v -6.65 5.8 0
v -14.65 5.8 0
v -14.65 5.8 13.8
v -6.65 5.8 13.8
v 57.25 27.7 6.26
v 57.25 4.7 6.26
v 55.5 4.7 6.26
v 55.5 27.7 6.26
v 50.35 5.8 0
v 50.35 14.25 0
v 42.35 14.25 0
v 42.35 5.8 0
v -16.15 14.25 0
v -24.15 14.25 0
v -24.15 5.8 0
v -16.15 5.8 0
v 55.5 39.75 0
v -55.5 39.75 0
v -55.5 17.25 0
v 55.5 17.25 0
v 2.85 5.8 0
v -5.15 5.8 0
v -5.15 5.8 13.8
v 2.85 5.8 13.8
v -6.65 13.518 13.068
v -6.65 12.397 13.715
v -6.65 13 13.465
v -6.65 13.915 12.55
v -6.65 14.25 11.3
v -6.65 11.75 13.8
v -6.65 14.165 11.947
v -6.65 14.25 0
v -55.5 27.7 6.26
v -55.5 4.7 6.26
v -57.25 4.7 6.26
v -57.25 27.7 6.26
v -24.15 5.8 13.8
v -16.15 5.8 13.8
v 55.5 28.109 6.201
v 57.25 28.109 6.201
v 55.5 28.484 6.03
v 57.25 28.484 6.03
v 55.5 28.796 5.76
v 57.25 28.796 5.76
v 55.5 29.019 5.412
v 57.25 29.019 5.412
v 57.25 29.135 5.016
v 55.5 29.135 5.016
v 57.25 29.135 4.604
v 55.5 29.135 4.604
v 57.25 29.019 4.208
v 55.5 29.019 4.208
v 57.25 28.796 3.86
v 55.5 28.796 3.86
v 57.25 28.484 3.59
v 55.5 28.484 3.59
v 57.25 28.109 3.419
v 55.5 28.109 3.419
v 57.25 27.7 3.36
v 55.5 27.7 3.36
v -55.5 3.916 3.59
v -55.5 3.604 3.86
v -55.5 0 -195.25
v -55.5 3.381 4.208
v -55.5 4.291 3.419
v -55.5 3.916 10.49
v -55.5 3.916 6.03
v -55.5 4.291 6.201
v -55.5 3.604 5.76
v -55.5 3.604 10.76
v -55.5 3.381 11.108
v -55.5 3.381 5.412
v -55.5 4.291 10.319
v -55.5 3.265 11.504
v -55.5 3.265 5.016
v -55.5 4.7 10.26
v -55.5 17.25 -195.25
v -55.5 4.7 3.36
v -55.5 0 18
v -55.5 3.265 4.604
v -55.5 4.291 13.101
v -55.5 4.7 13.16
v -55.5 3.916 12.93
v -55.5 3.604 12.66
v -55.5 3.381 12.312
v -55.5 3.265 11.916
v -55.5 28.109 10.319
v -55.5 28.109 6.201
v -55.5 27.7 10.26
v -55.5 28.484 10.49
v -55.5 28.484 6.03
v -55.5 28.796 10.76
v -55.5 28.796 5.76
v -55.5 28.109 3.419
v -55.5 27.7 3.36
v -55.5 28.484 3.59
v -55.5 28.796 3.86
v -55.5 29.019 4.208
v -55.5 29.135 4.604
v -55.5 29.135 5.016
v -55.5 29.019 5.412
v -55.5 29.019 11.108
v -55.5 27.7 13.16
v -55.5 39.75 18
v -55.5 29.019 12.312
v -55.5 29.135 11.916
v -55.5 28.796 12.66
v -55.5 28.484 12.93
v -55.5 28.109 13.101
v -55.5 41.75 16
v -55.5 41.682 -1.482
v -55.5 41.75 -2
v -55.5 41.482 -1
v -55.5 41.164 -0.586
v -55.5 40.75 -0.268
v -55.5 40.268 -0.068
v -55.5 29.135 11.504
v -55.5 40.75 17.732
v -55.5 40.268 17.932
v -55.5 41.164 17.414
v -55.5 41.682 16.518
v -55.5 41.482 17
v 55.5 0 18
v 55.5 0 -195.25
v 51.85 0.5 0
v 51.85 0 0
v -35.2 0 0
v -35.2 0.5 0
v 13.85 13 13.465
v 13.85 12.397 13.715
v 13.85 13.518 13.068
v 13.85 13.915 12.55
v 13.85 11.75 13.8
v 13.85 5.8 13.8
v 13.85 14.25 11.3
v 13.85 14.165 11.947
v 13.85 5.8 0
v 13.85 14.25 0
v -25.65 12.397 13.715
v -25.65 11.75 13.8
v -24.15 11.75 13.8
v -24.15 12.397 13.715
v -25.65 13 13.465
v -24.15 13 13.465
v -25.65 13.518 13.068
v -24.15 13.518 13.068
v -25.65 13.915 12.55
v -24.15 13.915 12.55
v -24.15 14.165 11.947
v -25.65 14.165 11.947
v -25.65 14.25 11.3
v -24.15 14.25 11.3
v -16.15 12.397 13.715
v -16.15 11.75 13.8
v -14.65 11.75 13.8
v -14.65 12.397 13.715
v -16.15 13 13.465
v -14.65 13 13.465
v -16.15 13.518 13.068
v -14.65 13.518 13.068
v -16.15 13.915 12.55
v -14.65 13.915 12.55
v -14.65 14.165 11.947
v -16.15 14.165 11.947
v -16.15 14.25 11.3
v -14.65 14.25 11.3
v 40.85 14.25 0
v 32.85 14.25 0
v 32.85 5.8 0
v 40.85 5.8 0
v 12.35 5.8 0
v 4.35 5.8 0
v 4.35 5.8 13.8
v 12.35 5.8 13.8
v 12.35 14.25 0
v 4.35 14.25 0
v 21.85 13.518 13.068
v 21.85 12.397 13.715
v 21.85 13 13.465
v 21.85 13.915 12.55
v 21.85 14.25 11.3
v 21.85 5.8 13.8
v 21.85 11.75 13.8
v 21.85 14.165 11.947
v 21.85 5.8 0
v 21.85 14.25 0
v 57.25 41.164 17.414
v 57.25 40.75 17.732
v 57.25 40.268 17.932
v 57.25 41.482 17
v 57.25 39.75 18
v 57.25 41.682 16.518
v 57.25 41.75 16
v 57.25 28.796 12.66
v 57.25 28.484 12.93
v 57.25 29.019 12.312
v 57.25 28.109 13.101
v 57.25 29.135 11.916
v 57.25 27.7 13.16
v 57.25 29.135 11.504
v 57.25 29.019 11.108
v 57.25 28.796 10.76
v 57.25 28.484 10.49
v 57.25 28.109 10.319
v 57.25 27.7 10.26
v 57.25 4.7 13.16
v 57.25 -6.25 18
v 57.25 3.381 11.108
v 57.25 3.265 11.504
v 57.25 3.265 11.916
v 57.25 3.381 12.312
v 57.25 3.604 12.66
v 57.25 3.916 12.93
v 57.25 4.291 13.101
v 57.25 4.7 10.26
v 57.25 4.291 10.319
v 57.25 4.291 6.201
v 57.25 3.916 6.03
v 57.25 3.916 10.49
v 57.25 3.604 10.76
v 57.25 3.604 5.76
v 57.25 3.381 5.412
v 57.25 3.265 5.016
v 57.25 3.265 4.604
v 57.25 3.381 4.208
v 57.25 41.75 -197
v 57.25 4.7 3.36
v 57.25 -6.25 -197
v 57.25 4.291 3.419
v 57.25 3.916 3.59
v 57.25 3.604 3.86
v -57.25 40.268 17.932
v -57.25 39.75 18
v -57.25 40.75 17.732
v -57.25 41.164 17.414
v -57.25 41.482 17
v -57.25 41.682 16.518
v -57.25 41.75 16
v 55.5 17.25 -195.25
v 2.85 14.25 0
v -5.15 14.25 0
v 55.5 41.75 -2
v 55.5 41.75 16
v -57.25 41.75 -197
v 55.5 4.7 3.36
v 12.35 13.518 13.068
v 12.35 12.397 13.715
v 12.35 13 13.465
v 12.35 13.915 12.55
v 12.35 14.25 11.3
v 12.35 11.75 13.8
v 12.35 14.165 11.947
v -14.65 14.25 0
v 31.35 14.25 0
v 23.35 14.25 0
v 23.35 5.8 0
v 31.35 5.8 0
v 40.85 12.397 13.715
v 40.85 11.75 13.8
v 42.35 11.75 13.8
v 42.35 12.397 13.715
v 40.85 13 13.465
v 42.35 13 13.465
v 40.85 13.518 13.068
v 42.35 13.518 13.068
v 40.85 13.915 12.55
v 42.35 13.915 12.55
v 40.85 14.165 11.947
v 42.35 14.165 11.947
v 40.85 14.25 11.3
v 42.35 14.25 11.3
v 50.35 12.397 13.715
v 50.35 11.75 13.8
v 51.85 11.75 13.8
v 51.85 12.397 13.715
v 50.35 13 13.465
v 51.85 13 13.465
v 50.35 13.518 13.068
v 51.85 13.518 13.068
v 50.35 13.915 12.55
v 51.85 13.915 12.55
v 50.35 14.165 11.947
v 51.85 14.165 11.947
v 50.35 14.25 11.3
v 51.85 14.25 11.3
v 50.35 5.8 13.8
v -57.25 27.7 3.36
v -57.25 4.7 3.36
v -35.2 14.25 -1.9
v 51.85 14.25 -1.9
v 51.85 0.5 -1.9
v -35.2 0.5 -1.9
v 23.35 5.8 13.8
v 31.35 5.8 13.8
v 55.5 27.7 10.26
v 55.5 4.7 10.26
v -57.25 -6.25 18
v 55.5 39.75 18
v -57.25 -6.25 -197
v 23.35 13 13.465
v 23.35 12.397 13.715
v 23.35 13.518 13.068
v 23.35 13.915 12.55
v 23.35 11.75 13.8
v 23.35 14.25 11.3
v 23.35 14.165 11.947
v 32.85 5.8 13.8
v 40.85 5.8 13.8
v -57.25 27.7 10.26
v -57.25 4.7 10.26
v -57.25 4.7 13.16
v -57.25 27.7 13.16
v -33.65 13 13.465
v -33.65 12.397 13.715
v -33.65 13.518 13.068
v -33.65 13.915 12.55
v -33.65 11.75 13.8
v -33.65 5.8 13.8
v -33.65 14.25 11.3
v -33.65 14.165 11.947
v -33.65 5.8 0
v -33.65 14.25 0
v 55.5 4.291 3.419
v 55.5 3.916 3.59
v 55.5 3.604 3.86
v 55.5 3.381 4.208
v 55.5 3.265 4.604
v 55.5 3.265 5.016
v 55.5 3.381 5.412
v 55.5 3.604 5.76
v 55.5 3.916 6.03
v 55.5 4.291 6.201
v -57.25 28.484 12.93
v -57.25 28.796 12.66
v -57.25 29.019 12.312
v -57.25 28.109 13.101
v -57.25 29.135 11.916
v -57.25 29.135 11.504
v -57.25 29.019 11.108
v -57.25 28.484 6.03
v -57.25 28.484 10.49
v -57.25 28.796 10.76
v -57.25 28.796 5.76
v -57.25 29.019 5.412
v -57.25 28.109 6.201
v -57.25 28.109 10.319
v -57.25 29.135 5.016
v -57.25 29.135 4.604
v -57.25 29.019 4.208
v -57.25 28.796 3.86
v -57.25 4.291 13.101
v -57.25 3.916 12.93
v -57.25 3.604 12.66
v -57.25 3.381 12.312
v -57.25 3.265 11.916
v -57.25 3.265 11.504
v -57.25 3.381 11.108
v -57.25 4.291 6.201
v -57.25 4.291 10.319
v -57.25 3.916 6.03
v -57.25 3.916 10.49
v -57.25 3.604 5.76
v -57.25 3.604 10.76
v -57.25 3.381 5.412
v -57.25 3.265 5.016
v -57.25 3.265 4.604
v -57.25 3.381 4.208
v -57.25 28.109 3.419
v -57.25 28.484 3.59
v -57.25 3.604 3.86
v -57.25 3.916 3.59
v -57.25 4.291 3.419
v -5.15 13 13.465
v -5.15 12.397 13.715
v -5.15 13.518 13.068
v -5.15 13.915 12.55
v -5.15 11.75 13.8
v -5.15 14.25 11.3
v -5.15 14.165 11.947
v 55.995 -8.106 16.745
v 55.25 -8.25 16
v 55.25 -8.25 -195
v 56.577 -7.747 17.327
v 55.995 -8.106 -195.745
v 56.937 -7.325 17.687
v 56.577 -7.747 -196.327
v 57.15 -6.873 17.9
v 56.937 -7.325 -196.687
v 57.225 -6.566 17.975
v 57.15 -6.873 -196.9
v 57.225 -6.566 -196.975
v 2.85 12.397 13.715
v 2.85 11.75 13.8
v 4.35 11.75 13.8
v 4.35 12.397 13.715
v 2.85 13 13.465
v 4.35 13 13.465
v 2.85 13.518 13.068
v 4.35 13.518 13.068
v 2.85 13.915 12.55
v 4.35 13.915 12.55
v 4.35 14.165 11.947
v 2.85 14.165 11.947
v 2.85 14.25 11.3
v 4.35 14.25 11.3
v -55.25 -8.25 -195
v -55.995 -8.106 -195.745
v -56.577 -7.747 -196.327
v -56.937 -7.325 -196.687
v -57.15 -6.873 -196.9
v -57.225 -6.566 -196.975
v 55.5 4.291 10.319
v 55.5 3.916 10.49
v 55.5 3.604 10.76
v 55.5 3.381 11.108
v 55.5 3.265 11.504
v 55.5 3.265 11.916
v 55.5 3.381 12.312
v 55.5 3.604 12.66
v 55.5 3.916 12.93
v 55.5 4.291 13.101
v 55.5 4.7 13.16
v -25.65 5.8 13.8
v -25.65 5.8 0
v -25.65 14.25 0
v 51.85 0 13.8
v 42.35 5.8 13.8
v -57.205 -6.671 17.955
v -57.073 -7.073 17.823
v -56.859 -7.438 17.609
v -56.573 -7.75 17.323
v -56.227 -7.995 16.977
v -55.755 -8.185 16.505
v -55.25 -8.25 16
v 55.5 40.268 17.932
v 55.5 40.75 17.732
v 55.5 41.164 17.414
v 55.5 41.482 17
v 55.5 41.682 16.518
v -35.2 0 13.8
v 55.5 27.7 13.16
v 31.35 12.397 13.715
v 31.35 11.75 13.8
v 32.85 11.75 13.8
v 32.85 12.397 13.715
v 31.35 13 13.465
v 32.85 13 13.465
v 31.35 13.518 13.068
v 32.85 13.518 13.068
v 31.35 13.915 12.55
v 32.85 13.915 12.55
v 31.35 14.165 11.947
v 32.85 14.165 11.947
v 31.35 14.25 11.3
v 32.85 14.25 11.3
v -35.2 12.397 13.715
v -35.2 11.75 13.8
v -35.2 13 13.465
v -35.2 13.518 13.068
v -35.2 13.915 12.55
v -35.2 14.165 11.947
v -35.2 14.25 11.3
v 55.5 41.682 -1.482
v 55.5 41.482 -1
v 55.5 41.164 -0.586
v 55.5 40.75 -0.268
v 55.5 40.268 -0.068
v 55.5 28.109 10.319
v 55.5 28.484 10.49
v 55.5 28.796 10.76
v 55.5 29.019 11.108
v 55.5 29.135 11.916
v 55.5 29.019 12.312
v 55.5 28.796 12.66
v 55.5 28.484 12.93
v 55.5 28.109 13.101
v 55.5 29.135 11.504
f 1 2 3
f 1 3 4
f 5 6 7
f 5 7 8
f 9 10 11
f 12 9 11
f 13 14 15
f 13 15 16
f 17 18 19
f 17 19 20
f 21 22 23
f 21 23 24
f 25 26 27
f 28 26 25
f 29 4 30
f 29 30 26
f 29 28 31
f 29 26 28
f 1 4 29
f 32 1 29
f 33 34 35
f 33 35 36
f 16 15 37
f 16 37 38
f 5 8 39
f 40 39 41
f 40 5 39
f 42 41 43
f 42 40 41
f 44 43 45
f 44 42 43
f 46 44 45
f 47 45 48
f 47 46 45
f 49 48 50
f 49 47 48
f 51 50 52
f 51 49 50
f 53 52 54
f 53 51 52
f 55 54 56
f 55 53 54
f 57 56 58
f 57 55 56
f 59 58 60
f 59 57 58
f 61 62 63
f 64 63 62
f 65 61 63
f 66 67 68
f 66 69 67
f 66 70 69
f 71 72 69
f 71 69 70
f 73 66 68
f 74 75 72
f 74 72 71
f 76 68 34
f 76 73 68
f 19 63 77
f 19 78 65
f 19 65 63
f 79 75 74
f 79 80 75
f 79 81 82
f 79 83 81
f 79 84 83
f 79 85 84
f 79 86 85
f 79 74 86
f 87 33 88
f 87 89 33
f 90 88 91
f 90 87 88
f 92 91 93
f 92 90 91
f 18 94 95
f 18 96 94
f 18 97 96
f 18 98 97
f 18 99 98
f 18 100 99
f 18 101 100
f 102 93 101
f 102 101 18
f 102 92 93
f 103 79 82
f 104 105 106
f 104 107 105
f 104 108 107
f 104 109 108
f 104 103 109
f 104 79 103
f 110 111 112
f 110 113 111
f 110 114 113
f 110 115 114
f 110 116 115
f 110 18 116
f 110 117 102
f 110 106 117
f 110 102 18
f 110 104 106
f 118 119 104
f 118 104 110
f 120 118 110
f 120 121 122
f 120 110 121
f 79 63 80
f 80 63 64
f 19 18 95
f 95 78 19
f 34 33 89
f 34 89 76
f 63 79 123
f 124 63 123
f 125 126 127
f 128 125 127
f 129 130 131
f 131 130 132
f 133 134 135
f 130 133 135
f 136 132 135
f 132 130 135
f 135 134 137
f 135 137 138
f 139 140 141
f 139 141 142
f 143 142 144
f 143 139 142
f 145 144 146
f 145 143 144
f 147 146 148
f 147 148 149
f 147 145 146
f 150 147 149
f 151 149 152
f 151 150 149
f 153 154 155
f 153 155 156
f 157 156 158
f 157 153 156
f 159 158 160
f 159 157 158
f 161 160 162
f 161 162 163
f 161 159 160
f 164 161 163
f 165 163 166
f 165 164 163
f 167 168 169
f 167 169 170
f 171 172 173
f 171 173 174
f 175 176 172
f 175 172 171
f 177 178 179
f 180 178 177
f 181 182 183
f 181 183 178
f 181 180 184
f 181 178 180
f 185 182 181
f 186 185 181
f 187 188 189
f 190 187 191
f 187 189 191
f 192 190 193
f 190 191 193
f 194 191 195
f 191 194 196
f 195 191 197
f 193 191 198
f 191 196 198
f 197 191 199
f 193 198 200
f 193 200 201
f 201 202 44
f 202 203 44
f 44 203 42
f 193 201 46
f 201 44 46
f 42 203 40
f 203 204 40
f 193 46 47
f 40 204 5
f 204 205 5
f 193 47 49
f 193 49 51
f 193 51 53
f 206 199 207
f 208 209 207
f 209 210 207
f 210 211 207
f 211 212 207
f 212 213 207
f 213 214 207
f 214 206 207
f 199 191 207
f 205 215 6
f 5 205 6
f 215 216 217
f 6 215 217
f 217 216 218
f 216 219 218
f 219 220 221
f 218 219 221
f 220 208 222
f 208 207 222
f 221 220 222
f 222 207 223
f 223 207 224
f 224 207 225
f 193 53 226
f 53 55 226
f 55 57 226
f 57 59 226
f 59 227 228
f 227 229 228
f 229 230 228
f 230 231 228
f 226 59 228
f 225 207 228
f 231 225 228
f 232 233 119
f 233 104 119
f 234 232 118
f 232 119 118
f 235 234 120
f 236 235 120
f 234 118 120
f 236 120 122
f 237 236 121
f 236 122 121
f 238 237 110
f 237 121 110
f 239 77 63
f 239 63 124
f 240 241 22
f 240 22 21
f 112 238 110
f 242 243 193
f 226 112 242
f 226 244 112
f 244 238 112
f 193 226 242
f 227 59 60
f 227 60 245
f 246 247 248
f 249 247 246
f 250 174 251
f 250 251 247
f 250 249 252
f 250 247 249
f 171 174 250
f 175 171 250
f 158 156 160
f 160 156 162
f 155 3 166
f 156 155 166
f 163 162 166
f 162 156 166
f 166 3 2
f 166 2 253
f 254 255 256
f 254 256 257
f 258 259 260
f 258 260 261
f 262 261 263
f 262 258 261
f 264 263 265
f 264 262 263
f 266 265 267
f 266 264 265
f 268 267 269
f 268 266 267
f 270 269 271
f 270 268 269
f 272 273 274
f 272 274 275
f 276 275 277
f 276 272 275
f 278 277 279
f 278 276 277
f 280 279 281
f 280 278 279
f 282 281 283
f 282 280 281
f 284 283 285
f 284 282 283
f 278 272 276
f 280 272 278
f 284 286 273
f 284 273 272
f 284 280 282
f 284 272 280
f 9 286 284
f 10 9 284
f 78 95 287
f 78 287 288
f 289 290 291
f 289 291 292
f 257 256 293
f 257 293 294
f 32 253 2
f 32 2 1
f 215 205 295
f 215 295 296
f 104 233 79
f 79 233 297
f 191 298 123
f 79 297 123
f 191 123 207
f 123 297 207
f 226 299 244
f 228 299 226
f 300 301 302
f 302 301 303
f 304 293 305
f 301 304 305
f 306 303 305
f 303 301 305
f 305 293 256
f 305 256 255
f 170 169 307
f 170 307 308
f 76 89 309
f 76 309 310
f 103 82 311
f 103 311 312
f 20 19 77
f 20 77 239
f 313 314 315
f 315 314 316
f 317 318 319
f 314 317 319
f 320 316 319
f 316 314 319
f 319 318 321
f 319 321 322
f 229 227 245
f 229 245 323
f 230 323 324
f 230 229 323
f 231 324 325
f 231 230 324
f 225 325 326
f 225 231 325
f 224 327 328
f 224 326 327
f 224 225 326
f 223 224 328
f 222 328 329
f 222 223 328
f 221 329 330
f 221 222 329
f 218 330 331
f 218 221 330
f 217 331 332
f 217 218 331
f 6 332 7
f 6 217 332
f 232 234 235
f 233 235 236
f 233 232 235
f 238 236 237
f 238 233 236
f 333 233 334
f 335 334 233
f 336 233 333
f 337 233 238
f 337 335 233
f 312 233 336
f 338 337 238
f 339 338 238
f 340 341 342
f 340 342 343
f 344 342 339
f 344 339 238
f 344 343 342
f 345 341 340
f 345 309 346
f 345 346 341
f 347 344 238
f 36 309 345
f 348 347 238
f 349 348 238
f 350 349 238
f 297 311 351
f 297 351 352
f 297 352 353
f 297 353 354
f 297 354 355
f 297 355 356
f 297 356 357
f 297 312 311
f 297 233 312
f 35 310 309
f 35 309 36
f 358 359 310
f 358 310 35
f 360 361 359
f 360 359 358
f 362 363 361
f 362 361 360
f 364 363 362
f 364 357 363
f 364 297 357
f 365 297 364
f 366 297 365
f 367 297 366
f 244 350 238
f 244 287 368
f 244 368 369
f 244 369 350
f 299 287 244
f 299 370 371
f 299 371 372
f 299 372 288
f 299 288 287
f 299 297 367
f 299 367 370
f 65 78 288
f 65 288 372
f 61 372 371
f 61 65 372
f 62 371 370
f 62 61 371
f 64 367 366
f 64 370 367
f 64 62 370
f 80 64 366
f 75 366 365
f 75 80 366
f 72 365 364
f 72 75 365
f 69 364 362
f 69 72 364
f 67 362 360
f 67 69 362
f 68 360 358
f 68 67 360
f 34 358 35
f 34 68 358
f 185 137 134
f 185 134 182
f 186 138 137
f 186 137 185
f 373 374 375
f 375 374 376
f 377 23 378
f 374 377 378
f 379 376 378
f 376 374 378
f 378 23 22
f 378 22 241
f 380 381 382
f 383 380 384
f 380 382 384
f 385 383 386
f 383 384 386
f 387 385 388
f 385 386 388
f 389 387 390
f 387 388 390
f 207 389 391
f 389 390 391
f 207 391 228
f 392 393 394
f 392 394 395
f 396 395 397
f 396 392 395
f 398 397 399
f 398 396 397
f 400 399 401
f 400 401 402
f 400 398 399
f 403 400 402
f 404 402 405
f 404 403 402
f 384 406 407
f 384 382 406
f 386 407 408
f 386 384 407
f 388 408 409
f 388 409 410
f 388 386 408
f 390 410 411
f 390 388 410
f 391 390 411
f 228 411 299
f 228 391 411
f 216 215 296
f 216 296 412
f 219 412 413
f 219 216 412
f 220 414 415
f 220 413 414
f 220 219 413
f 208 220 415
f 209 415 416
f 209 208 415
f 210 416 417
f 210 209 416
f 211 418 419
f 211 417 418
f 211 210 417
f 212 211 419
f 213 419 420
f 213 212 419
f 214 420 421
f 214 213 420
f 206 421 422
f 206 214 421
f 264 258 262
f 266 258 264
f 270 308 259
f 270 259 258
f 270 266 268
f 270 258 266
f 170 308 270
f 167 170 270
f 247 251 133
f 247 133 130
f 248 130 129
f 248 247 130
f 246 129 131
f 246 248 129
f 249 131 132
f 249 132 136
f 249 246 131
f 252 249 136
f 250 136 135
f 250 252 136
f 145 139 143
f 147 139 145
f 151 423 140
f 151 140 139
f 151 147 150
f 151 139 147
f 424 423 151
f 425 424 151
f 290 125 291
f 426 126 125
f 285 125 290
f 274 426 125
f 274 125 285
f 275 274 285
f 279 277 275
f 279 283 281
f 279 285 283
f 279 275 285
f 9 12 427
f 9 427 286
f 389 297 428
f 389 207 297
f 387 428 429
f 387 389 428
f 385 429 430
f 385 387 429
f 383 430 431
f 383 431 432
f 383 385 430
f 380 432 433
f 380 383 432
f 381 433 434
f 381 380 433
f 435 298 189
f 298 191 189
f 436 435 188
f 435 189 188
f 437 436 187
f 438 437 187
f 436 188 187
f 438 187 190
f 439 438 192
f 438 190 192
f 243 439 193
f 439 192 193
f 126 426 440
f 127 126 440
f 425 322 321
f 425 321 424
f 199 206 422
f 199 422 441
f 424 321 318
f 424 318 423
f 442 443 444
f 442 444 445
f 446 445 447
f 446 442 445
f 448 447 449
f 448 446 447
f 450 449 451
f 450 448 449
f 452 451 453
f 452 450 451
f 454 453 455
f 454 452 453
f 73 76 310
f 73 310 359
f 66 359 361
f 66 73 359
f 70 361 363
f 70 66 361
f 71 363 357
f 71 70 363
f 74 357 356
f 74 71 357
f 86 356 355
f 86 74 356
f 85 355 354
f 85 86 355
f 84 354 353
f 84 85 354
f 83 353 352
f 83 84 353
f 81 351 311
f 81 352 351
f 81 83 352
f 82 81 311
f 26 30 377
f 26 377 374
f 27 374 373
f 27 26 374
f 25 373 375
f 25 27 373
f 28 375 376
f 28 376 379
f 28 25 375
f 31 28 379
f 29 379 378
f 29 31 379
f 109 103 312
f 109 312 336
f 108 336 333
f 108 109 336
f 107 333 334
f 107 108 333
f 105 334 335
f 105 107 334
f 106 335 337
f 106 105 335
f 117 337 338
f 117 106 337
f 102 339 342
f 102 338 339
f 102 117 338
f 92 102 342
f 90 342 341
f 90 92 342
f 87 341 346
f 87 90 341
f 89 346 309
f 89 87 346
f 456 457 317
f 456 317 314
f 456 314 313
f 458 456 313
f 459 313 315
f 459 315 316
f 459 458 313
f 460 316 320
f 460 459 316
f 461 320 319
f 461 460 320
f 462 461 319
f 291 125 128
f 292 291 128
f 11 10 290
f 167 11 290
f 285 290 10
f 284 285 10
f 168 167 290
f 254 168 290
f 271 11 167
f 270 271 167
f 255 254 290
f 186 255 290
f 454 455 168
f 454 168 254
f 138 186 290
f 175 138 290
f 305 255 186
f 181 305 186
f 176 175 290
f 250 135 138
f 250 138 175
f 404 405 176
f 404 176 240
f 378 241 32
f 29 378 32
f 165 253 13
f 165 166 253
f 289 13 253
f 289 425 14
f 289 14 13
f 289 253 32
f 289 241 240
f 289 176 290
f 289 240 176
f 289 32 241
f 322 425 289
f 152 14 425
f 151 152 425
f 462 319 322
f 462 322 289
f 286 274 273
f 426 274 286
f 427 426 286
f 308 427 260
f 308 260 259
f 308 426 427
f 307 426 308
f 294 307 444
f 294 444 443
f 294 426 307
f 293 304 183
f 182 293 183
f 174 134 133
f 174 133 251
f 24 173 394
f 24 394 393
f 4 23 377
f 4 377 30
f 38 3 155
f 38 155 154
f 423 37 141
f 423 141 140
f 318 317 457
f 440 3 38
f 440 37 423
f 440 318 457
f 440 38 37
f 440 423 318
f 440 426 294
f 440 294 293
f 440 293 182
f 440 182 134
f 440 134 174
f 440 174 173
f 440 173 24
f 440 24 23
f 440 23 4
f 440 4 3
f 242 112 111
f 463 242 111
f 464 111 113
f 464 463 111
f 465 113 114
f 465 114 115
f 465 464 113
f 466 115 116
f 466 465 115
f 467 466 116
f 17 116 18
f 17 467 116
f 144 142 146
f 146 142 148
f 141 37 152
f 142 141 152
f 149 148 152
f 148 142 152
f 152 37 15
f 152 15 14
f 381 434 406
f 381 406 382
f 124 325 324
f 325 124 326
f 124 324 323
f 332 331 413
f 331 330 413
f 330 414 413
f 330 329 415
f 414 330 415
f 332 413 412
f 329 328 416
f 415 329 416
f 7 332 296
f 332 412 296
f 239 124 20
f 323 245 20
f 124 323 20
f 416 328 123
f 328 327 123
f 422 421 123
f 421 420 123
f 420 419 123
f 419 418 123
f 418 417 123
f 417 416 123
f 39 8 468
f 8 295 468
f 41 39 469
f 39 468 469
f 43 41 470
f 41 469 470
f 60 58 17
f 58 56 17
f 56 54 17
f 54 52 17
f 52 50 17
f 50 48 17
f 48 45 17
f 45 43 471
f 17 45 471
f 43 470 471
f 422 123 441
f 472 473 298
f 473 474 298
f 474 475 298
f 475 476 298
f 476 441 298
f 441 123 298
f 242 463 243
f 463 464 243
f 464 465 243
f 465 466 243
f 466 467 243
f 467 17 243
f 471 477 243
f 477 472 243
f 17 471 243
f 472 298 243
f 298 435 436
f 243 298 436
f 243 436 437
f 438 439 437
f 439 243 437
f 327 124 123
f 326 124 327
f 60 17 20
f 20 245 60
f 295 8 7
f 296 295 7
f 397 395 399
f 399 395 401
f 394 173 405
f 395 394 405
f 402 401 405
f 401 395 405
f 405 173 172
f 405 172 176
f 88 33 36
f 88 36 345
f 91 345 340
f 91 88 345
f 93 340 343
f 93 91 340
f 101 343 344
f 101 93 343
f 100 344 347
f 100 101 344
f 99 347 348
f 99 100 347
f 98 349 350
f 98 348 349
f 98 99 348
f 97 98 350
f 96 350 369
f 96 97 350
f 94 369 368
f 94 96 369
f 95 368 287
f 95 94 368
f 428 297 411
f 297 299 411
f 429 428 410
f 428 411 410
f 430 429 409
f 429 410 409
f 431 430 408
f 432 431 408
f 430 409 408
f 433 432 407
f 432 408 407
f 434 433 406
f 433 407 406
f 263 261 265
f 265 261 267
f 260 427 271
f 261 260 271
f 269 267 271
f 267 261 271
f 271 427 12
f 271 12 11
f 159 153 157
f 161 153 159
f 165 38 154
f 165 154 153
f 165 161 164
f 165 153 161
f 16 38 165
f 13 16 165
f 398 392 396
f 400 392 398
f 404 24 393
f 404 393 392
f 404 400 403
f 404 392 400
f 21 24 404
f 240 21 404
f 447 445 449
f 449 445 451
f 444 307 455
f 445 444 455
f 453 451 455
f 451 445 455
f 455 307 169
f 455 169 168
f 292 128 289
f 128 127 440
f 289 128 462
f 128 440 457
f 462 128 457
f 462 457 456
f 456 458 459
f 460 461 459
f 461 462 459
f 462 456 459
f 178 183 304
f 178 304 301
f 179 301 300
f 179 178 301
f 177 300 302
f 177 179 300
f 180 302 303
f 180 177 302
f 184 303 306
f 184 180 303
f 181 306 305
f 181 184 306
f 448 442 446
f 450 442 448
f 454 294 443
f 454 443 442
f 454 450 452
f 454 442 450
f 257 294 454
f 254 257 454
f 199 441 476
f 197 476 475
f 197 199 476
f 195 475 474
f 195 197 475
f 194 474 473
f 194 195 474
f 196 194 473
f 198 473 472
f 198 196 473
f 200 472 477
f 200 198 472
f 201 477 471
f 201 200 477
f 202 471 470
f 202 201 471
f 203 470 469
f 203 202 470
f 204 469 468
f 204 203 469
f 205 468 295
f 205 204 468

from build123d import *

# Parameters (mm, degrees)
BOSS_EXTRUDE1_DEPTH      = 41.75
BOSS_EXTRUDE1_DEPTH_BACK = 8.25
SKETCH1_W                = 114.5
SKETCH1_H                = 215
SKETCH2_W                = 111
SKETCH2_H                = 41.75
CUT_EXTRUDE1_DEPTH       = 18
CUT_EXTRUDE2_DEPTH       = 232.651273469
FILLET1_R                = 2
SKETCH4_W                = 87.05
SKETCH4_H                = 13.8
BOSS_EXTRUDE2_DEPTH      = 14.25
SKETCH7_W                = 111
SKETCH7_H                = 17.25
CUT_EXTRUDE4_DEPTH       = 195.25
FILLET2_R                = 2.5
CUT_EXTRUDE3_START       = -13.8
SKETCH6_W                = 8
SKETCH6_H                = 8.45
CUT_EXTRUDE3_DEPTH       = 13.8
SKETCH9_W                = 87.05
SKETCH9_H                = 13.75
BOSS_EXTRUDE6_DEPTH      = 1.9
LPATTERN1_COUNT          = 9
LPATTERN1_PITCH          = 9.5


with BuildPart() as part:
    # Sketch1 → Boss-Extrude1 (new, two sides: drawn at the far end of the back side and taken through both)
    with BuildSketch(Plane(origin=(0, 0, 0), x_dir=(1, 0, 0), z_dir=(0, 1, 0)).offset(-BOSS_EXTRUDE1_DEPTH_BACK)):
        with Locations((0, 89.5)):
            Rectangle(SKETCH1_W, SKETCH1_H)
    extrude(amount=BOSS_EXTRUDE1_DEPTH + BOSS_EXTRUDE1_DEPTH_BACK)

    # Sketch2 → Cut-Extrude1 (cut)
    with BuildSketch(Plane.XY.offset(18)):
        with Locations((0, 20.875)):
            Rectangle(SKETCH2_W, SKETCH2_H)
    extrude(amount=-CUT_EXTRUDE1_DEPTH, mode=Mode.SUBTRACT)

    # Sketch3 → Cut-Extrude2 (cut, through all)
    with BuildSketch(Plane(origin=(57.25, 0, 0), x_dir=(0, 0, -1), z_dir=(1, 0, 0))):
        with BuildLine():
            Line((-10.26, 27.7), (-10.26, 4.7))
            ThreePointArc((-10.26, 4.7), (-11.71, 3.25), (-13.16, 4.7))
            Line((-13.16, 4.7), (-13.16, 27.7))
            ThreePointArc((-13.16, 27.7), (-11.71, 29.15), (-10.26, 27.7))
        make_face()
        with BuildLine():
            Line((-3.36, 27.7), (-3.36, 4.7))
            ThreePointArc((-3.36, 4.7), (-4.81, 3.25), (-6.26, 4.7))
            Line((-6.26, 4.7), (-6.26, 27.7))
            ThreePointArc((-6.26, 27.7), (-4.81, 29.15), (-3.36, 27.7))
        make_face()
    extrude(amount=-CUT_EXTRUDE2_DEPTH, mode=Mode.SUBTRACT)

    # Fillet1
    fillet1_edges = [part.edges().sort_by_distance(p)[0] for p in [
        (57.25, -8.25, -89.5),
        (-56.375, 41.75, 18),
        (0, -8.25, -197),
        (56.375, 41.75, 18),
        (0, 41.75, 0),
        (-57.25, -8.25, -89.5),
        (0, -8.25, 18),
    ]]
    fillet(fillet1_edges, radius=FILLET1_R)

    # Sketch7 → Cut-Extrude4 (cut)
    with BuildSketch(Plane.XY):
        with Locations((0, 8.625)):
            Rectangle(SKETCH7_W, SKETCH7_H)
    extrude(amount=-CUT_EXTRUDE4_DEPTH, mode=Mode.SUBTRACT)


with BuildPart() as body_2:
    # Sketch4 → Boss-Extrude2 (new body)
    with BuildSketch(Plane(origin=(0, 0, 0), x_dir=(-1, 0, 0), z_dir=(0, 1, 0))):
        with Locations((-8.325, 6.9)):
            Rectangle(SKETCH4_W, SKETCH4_H)
    extrude(amount=BOSS_EXTRUDE2_DEPTH)

    # Fillet2
    fillet2_edges = [body_2.edges().sort_by_distance(p)[0] for p in [
        (8.325, 14.25, 13.8),
    ]]
    fillet(fillet2_edges, radius=FILLET2_R)

    # Sketch6 → Cut-Extrude3 (cut)
    with BuildSketch(Plane.XY.offset(13.8).offset(CUT_EXTRUDE3_START)):
        with Locations((46.35, 10.025)):
            Rectangle(SKETCH6_W, SKETCH6_H)
    cut_extrude3 = extrude(amount=CUT_EXTRUDE3_DEPTH, mode=Mode.SUBTRACT)

    # Sketch9 → Boss-Extrude6 (add)
    with BuildSketch(Plane(origin=(0, 0, 0), x_dir=(-1, 0, 0), z_dir=(0, 0, -1))):
        with Locations((-8.325, 7.375)):
            Rectangle(SKETCH9_W, SKETCH9_H)
    extrude(amount=BOSS_EXTRUDE6_DEPTH)

    # LPattern1: Cut-Extrude3 ×9
    with Locations(*[(-i * LPATTERN1_PITCH, 0, 0) for i in range(1, LPATTERN1_COUNT)]):
        add(cut_extrude3, mode=Mode.SUBTRACT)


solid = Compound([part.part, body_2.part])
